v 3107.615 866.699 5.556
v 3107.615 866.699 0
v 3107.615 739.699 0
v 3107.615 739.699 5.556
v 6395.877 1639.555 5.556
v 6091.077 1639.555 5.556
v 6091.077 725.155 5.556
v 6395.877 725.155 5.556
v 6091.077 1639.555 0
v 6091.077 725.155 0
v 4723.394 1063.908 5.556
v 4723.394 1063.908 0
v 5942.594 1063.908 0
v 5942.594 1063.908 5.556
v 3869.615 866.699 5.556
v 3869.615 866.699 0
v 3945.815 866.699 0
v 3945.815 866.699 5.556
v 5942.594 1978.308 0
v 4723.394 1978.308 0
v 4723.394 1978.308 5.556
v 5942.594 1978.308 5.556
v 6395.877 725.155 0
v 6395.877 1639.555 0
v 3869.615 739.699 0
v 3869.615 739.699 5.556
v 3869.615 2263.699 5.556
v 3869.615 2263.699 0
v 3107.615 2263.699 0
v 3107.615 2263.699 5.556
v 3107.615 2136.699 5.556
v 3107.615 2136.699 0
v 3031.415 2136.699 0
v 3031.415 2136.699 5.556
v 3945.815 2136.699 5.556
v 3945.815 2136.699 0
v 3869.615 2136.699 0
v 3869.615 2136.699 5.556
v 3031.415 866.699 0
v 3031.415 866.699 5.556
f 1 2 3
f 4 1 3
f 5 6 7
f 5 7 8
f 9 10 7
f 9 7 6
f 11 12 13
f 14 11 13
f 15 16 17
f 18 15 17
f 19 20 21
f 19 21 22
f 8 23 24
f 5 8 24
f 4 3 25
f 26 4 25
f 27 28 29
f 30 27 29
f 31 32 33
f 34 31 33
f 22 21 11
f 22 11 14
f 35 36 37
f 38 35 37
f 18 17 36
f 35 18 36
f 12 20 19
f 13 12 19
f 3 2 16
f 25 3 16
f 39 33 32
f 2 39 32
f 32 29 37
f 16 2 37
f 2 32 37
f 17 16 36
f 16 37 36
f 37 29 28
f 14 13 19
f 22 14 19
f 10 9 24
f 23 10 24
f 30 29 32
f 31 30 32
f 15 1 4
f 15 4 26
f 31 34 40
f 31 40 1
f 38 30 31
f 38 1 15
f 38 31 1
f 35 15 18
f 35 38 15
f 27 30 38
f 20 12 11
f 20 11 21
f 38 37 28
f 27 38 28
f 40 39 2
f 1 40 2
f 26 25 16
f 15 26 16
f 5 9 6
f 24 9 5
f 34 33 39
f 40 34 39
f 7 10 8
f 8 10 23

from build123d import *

# Parameters (mm, degrees)
F1_DEPTH = 5.55625
F0_W     = 1219.2
F0_H     = 914.4
F2_DEPTH = 5.55625
F0_W_2   = 304.8
F3_DEPTH = 5.55625


# Not quite as in the source:
# - a length typed as a fraction of an inch, garbled in the dataset ("3 / 203.2 mm" for 3/8 in), is restored


with BuildPart() as f1:
    # F0 (on Top) → F1 (new body)
    with BuildSketch(Plane.XY):
        Polygon((3107.6152240753, 866.6990060806), (3107.6152240753, 739.6990060806), (3869.6152240753, 739.6990060806), (3869.6152240753, 866.6990060806), (3945.8152240753, 866.6990060806), (3945.8152240753, 2136.6990060806), (3869.6152240753, 2136.6990060806), (3869.6152240753, 2263.6990060806), (3107.6152240753, 2263.6990060806), (3107.6152240753, 2136.6990060806), (3031.4152240753, 2136.6990060806), (3031.4152240753, 866.6990060806), align=None)
    extrude(amount=F1_DEPTH)


with BuildPart() as f2:
    # F0 (on Top) → F2 (new body)
    with BuildSketch(Plane.XY):
        with Locations((5332.9943939209, 1521.108457756)):
            Rectangle(F0_W, F0_H)
    extrude(amount=F2_DEPTH)


with BuildPart() as f3:
    # F0 (on Top) → F3 (new body)
    with BuildSketch(Plane.XY):
        with Locations((6243.4768508911, 1182.3549363136)):
            Rectangle(F0_W_2, F0_H)
    extrude(amount=F3_DEPTH)


solid = Compound([f1.part, f2.part, f3.part])
